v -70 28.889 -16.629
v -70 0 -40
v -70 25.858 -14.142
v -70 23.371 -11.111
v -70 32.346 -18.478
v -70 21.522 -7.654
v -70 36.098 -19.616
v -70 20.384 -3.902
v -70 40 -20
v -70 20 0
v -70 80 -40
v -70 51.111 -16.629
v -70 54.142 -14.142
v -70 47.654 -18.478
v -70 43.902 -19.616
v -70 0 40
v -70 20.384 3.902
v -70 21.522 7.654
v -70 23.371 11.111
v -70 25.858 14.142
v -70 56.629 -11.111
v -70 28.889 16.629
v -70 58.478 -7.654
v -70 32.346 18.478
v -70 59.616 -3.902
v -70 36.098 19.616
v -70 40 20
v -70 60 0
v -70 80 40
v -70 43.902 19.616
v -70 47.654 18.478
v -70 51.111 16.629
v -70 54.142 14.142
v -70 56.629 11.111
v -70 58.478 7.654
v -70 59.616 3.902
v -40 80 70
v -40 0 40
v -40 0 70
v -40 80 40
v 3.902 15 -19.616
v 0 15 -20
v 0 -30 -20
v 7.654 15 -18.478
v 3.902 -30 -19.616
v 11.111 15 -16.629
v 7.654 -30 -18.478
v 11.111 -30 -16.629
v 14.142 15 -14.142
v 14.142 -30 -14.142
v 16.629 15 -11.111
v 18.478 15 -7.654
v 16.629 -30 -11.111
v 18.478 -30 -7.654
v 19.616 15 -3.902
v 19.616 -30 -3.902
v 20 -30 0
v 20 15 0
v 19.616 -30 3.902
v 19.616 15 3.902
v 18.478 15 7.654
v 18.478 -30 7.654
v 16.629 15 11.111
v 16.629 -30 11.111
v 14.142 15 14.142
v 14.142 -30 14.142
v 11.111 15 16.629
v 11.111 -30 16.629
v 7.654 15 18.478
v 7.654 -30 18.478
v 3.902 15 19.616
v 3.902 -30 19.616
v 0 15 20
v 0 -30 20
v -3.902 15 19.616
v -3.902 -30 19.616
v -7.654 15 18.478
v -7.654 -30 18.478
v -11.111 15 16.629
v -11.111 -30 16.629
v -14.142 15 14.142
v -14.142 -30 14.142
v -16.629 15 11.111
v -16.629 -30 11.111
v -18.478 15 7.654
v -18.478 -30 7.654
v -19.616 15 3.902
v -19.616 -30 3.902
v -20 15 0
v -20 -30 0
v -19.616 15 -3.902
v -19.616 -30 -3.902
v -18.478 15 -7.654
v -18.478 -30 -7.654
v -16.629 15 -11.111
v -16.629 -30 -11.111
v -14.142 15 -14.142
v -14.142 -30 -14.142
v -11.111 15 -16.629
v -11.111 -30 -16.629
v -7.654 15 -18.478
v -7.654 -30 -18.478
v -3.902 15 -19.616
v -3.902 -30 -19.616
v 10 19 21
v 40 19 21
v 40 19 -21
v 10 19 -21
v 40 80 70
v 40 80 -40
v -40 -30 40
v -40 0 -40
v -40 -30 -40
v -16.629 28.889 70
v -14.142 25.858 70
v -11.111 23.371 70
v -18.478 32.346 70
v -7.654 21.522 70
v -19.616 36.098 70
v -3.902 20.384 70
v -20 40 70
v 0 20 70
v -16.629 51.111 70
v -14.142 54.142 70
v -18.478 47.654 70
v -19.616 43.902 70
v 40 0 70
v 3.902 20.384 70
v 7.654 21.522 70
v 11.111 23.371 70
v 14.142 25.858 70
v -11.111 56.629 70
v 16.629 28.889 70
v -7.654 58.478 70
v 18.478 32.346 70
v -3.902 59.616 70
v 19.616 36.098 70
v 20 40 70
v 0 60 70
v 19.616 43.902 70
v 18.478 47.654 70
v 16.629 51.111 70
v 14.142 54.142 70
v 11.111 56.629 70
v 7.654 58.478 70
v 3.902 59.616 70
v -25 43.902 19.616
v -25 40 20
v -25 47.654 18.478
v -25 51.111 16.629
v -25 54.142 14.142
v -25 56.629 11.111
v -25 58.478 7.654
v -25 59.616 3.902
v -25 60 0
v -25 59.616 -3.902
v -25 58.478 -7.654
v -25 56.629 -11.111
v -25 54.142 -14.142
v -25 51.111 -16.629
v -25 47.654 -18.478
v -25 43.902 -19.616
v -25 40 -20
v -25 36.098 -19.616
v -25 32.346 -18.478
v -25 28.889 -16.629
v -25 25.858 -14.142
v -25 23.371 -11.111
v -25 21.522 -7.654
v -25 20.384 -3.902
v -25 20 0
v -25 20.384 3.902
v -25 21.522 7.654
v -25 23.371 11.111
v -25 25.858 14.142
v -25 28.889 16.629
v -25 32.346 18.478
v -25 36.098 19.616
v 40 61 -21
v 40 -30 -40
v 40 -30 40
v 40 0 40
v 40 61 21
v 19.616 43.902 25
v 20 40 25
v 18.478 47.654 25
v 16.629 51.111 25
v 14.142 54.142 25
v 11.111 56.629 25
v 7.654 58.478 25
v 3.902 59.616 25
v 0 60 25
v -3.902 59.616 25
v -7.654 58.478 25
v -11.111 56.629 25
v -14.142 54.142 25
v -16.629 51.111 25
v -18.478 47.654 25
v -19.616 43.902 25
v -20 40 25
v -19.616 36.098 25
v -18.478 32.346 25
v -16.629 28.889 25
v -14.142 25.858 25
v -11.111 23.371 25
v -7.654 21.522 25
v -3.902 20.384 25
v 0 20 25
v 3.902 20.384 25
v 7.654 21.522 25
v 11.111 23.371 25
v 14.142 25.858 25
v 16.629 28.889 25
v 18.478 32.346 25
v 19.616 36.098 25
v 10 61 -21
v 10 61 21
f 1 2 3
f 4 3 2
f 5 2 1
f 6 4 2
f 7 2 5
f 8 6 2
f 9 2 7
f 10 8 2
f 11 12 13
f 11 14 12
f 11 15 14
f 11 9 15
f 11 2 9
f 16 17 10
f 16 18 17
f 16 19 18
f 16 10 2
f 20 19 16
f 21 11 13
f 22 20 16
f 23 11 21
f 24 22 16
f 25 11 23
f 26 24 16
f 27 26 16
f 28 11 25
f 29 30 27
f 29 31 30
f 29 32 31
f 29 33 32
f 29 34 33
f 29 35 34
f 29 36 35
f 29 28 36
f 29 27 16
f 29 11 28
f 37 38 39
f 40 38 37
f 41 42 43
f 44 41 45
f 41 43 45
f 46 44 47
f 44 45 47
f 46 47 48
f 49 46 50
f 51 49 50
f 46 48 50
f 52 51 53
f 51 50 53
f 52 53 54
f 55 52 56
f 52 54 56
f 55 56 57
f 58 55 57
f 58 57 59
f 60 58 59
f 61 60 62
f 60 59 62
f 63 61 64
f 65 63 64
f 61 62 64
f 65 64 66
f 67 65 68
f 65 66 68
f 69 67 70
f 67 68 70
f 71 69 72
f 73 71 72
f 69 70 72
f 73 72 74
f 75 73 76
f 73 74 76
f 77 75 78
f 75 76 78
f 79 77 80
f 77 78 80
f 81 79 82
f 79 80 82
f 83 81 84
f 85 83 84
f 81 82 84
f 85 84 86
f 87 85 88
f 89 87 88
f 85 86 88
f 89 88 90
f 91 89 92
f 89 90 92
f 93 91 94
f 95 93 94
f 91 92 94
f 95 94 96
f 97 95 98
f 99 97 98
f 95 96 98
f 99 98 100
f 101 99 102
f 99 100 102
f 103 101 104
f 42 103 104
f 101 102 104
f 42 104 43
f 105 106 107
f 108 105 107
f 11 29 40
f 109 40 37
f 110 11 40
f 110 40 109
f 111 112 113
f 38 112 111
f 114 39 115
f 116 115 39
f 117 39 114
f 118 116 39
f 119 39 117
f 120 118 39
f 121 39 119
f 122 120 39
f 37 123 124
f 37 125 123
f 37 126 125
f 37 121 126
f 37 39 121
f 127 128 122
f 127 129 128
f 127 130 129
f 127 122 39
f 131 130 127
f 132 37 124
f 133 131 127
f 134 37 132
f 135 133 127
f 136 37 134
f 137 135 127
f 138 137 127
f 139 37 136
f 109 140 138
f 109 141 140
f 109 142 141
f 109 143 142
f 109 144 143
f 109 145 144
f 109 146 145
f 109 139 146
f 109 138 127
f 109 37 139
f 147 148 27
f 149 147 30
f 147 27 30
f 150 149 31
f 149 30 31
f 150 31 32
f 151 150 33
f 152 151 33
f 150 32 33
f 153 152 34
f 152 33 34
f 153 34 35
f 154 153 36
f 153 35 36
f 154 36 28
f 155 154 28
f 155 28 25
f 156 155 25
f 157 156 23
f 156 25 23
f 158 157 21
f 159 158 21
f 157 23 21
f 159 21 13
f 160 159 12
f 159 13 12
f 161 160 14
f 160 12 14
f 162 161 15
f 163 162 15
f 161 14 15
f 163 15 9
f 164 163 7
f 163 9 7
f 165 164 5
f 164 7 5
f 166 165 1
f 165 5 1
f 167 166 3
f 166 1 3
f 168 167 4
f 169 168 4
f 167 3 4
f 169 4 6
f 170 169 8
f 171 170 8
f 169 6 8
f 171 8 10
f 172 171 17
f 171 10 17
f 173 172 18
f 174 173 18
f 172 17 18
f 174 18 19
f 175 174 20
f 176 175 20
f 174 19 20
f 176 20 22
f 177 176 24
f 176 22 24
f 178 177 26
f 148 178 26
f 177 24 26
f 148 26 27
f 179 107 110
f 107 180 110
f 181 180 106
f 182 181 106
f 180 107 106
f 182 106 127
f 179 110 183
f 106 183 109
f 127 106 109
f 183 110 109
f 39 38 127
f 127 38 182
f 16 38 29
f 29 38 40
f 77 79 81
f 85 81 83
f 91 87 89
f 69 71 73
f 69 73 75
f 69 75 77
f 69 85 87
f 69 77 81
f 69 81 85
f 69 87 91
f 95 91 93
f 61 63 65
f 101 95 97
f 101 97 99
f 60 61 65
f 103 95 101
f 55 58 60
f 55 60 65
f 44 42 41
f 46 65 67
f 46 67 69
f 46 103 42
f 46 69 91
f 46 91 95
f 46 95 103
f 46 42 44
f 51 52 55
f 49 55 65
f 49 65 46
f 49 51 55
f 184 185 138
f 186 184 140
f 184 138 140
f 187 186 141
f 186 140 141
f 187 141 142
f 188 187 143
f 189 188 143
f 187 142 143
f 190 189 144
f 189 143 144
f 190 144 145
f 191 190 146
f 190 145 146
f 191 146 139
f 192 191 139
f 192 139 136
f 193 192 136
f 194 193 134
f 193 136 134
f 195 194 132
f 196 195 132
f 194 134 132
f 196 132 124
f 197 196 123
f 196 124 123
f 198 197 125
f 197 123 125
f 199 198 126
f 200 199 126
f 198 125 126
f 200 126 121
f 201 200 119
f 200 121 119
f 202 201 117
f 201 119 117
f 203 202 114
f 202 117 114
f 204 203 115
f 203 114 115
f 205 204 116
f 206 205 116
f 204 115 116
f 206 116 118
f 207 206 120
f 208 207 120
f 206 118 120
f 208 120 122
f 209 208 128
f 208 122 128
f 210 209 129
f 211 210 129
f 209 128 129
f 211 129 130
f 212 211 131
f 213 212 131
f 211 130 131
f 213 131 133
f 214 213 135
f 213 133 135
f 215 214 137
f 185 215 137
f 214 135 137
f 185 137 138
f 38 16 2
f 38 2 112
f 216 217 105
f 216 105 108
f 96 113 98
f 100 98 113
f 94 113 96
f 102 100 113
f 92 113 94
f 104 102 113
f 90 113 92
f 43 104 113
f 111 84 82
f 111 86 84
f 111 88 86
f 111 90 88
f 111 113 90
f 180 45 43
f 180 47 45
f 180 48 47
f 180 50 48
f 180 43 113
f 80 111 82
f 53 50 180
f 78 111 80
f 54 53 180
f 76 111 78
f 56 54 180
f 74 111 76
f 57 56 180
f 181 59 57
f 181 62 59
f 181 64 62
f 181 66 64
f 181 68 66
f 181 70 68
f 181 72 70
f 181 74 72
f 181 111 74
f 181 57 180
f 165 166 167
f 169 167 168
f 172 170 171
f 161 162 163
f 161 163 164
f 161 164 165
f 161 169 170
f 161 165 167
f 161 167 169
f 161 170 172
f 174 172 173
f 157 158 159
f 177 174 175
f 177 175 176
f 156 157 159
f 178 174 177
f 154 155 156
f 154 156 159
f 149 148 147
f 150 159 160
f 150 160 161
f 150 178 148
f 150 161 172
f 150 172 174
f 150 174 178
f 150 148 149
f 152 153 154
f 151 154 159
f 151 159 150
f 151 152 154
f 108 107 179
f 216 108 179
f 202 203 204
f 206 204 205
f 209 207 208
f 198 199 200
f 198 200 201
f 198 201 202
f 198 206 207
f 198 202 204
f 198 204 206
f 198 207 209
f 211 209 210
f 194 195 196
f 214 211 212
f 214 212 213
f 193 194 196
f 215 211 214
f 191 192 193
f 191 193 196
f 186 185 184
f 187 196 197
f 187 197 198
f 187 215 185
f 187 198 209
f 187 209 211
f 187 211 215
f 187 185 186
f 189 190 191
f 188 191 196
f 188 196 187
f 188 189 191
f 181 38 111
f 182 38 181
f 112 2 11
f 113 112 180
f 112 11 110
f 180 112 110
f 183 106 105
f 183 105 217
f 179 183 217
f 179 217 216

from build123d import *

# Parameters (mm, degrees)
ESQUISSE2_W             = 80
ESQUISSE2_H             = 80
BOSS_EXTRU_1_DEPTH      = 80
ESQUISSE5_W             = 80
ESQUISSE5_H             = 80
BOSS_EXTRU_2_DEPTH      = 30
ESQUISSE6_W             = 80
ESQUISSE6_H             = 80
BOSS_EXTRU_3_DEPTH      = 30
ESQUISSE7_W             = 80
ESQUISSE7_H             = 80
BOSS_EXTRU_4_DEPTH      = 30
ESQUISSE8_R             = 20
ENL_V_MAT_EXTRU_1_DEPTH = 45
ESQUISSE9_R             = 20
ENL_V_MAT_EXTRU_2_DEPTH = 45
ESQUISSE10_R            = 20
ENL_V_MAT_EXTRU_3_DEPTH = 45
ESQUISSE11_W            = 42
ESQUISSE11_H            = 42
ENL_V_MAT_EXTRU_4_DEPTH = 30


with BuildPart() as part:
    # Esquisse2 → Boss.-Extru.1 (new body)
    with BuildSketch(Plane(origin=(0, 0, 0), x_dir=(1, 0, 0), z_dir=(0, 1, 0))):
        Rectangle(ESQUISSE2_W, ESQUISSE2_H)
    extrude(amount=BOSS_EXTRU_1_DEPTH)

    # Esquisse5 → Boss.-Extru.2 (add)
    with BuildSketch(Plane.ZY.offset(40)):
        with Locations((0, 40)):
            Rectangle(ESQUISSE5_W, ESQUISSE5_H)
    extrude(amount=BOSS_EXTRU_2_DEPTH)

    # Esquisse6 → Boss.-Extru.3 (add)
    with BuildSketch(Plane.XY.offset(40)):
        with Locations((0, 40)):
            Rectangle(ESQUISSE6_W, ESQUISSE6_H)
    extrude(amount=BOSS_EXTRU_3_DEPTH)

    # Esquisse7 → Boss.-Extru.4 (add)
    with BuildSketch(Plane.XZ):
        Rectangle(ESQUISSE7_W, ESQUISSE7_H)
    extrude(amount=BOSS_EXTRU_4_DEPTH)

    # Esquisse8 → Enlèv. mat.-Extru.1 (cut)
    with BuildSketch(Plane.ZY.offset(70)):
        with Locations((0, 40)):
            Circle(ESQUISSE8_R)
    extrude(amount=-ENL_V_MAT_EXTRU_1_DEPTH, mode=Mode.SUBTRACT)

    # Esquisse9 → Enlèv. mat.-Extru.2 (cut)
    with BuildSketch(Plane.XY.offset(70)):
        with Locations((0, 40)):
            Circle(ESQUISSE9_R)
    extrude(amount=-ENL_V_MAT_EXTRU_2_DEPTH, mode=Mode.SUBTRACT)

    # Esquisse10 → Enlèv. mat.-Extru.3 (cut)
    with BuildSketch(Plane.XZ.offset(30)):
        with Locations(Location((0, 0, 0), (0, 0, 270))):
            Circle(ESQUISSE10_R)
    extrude(amount=-ENL_V_MAT_EXTRU_3_DEPTH, mode=Mode.SUBTRACT)

    # Esquisse11 → Enlèv. mat.-Extru.4 (cut)
    with BuildSketch(Plane(origin=(40, 0, 0), x_dir=(0, 0, -1), z_dir=(1, 0, 0))):
        with Locations((0, 40)):
            Rectangle(ESQUISSE11_W, ESQUISSE11_H)
    extrude(amount=-ENL_V_MAT_EXTRU_4_DEPTH, mode=Mode.SUBTRACT)


solid = part.part
